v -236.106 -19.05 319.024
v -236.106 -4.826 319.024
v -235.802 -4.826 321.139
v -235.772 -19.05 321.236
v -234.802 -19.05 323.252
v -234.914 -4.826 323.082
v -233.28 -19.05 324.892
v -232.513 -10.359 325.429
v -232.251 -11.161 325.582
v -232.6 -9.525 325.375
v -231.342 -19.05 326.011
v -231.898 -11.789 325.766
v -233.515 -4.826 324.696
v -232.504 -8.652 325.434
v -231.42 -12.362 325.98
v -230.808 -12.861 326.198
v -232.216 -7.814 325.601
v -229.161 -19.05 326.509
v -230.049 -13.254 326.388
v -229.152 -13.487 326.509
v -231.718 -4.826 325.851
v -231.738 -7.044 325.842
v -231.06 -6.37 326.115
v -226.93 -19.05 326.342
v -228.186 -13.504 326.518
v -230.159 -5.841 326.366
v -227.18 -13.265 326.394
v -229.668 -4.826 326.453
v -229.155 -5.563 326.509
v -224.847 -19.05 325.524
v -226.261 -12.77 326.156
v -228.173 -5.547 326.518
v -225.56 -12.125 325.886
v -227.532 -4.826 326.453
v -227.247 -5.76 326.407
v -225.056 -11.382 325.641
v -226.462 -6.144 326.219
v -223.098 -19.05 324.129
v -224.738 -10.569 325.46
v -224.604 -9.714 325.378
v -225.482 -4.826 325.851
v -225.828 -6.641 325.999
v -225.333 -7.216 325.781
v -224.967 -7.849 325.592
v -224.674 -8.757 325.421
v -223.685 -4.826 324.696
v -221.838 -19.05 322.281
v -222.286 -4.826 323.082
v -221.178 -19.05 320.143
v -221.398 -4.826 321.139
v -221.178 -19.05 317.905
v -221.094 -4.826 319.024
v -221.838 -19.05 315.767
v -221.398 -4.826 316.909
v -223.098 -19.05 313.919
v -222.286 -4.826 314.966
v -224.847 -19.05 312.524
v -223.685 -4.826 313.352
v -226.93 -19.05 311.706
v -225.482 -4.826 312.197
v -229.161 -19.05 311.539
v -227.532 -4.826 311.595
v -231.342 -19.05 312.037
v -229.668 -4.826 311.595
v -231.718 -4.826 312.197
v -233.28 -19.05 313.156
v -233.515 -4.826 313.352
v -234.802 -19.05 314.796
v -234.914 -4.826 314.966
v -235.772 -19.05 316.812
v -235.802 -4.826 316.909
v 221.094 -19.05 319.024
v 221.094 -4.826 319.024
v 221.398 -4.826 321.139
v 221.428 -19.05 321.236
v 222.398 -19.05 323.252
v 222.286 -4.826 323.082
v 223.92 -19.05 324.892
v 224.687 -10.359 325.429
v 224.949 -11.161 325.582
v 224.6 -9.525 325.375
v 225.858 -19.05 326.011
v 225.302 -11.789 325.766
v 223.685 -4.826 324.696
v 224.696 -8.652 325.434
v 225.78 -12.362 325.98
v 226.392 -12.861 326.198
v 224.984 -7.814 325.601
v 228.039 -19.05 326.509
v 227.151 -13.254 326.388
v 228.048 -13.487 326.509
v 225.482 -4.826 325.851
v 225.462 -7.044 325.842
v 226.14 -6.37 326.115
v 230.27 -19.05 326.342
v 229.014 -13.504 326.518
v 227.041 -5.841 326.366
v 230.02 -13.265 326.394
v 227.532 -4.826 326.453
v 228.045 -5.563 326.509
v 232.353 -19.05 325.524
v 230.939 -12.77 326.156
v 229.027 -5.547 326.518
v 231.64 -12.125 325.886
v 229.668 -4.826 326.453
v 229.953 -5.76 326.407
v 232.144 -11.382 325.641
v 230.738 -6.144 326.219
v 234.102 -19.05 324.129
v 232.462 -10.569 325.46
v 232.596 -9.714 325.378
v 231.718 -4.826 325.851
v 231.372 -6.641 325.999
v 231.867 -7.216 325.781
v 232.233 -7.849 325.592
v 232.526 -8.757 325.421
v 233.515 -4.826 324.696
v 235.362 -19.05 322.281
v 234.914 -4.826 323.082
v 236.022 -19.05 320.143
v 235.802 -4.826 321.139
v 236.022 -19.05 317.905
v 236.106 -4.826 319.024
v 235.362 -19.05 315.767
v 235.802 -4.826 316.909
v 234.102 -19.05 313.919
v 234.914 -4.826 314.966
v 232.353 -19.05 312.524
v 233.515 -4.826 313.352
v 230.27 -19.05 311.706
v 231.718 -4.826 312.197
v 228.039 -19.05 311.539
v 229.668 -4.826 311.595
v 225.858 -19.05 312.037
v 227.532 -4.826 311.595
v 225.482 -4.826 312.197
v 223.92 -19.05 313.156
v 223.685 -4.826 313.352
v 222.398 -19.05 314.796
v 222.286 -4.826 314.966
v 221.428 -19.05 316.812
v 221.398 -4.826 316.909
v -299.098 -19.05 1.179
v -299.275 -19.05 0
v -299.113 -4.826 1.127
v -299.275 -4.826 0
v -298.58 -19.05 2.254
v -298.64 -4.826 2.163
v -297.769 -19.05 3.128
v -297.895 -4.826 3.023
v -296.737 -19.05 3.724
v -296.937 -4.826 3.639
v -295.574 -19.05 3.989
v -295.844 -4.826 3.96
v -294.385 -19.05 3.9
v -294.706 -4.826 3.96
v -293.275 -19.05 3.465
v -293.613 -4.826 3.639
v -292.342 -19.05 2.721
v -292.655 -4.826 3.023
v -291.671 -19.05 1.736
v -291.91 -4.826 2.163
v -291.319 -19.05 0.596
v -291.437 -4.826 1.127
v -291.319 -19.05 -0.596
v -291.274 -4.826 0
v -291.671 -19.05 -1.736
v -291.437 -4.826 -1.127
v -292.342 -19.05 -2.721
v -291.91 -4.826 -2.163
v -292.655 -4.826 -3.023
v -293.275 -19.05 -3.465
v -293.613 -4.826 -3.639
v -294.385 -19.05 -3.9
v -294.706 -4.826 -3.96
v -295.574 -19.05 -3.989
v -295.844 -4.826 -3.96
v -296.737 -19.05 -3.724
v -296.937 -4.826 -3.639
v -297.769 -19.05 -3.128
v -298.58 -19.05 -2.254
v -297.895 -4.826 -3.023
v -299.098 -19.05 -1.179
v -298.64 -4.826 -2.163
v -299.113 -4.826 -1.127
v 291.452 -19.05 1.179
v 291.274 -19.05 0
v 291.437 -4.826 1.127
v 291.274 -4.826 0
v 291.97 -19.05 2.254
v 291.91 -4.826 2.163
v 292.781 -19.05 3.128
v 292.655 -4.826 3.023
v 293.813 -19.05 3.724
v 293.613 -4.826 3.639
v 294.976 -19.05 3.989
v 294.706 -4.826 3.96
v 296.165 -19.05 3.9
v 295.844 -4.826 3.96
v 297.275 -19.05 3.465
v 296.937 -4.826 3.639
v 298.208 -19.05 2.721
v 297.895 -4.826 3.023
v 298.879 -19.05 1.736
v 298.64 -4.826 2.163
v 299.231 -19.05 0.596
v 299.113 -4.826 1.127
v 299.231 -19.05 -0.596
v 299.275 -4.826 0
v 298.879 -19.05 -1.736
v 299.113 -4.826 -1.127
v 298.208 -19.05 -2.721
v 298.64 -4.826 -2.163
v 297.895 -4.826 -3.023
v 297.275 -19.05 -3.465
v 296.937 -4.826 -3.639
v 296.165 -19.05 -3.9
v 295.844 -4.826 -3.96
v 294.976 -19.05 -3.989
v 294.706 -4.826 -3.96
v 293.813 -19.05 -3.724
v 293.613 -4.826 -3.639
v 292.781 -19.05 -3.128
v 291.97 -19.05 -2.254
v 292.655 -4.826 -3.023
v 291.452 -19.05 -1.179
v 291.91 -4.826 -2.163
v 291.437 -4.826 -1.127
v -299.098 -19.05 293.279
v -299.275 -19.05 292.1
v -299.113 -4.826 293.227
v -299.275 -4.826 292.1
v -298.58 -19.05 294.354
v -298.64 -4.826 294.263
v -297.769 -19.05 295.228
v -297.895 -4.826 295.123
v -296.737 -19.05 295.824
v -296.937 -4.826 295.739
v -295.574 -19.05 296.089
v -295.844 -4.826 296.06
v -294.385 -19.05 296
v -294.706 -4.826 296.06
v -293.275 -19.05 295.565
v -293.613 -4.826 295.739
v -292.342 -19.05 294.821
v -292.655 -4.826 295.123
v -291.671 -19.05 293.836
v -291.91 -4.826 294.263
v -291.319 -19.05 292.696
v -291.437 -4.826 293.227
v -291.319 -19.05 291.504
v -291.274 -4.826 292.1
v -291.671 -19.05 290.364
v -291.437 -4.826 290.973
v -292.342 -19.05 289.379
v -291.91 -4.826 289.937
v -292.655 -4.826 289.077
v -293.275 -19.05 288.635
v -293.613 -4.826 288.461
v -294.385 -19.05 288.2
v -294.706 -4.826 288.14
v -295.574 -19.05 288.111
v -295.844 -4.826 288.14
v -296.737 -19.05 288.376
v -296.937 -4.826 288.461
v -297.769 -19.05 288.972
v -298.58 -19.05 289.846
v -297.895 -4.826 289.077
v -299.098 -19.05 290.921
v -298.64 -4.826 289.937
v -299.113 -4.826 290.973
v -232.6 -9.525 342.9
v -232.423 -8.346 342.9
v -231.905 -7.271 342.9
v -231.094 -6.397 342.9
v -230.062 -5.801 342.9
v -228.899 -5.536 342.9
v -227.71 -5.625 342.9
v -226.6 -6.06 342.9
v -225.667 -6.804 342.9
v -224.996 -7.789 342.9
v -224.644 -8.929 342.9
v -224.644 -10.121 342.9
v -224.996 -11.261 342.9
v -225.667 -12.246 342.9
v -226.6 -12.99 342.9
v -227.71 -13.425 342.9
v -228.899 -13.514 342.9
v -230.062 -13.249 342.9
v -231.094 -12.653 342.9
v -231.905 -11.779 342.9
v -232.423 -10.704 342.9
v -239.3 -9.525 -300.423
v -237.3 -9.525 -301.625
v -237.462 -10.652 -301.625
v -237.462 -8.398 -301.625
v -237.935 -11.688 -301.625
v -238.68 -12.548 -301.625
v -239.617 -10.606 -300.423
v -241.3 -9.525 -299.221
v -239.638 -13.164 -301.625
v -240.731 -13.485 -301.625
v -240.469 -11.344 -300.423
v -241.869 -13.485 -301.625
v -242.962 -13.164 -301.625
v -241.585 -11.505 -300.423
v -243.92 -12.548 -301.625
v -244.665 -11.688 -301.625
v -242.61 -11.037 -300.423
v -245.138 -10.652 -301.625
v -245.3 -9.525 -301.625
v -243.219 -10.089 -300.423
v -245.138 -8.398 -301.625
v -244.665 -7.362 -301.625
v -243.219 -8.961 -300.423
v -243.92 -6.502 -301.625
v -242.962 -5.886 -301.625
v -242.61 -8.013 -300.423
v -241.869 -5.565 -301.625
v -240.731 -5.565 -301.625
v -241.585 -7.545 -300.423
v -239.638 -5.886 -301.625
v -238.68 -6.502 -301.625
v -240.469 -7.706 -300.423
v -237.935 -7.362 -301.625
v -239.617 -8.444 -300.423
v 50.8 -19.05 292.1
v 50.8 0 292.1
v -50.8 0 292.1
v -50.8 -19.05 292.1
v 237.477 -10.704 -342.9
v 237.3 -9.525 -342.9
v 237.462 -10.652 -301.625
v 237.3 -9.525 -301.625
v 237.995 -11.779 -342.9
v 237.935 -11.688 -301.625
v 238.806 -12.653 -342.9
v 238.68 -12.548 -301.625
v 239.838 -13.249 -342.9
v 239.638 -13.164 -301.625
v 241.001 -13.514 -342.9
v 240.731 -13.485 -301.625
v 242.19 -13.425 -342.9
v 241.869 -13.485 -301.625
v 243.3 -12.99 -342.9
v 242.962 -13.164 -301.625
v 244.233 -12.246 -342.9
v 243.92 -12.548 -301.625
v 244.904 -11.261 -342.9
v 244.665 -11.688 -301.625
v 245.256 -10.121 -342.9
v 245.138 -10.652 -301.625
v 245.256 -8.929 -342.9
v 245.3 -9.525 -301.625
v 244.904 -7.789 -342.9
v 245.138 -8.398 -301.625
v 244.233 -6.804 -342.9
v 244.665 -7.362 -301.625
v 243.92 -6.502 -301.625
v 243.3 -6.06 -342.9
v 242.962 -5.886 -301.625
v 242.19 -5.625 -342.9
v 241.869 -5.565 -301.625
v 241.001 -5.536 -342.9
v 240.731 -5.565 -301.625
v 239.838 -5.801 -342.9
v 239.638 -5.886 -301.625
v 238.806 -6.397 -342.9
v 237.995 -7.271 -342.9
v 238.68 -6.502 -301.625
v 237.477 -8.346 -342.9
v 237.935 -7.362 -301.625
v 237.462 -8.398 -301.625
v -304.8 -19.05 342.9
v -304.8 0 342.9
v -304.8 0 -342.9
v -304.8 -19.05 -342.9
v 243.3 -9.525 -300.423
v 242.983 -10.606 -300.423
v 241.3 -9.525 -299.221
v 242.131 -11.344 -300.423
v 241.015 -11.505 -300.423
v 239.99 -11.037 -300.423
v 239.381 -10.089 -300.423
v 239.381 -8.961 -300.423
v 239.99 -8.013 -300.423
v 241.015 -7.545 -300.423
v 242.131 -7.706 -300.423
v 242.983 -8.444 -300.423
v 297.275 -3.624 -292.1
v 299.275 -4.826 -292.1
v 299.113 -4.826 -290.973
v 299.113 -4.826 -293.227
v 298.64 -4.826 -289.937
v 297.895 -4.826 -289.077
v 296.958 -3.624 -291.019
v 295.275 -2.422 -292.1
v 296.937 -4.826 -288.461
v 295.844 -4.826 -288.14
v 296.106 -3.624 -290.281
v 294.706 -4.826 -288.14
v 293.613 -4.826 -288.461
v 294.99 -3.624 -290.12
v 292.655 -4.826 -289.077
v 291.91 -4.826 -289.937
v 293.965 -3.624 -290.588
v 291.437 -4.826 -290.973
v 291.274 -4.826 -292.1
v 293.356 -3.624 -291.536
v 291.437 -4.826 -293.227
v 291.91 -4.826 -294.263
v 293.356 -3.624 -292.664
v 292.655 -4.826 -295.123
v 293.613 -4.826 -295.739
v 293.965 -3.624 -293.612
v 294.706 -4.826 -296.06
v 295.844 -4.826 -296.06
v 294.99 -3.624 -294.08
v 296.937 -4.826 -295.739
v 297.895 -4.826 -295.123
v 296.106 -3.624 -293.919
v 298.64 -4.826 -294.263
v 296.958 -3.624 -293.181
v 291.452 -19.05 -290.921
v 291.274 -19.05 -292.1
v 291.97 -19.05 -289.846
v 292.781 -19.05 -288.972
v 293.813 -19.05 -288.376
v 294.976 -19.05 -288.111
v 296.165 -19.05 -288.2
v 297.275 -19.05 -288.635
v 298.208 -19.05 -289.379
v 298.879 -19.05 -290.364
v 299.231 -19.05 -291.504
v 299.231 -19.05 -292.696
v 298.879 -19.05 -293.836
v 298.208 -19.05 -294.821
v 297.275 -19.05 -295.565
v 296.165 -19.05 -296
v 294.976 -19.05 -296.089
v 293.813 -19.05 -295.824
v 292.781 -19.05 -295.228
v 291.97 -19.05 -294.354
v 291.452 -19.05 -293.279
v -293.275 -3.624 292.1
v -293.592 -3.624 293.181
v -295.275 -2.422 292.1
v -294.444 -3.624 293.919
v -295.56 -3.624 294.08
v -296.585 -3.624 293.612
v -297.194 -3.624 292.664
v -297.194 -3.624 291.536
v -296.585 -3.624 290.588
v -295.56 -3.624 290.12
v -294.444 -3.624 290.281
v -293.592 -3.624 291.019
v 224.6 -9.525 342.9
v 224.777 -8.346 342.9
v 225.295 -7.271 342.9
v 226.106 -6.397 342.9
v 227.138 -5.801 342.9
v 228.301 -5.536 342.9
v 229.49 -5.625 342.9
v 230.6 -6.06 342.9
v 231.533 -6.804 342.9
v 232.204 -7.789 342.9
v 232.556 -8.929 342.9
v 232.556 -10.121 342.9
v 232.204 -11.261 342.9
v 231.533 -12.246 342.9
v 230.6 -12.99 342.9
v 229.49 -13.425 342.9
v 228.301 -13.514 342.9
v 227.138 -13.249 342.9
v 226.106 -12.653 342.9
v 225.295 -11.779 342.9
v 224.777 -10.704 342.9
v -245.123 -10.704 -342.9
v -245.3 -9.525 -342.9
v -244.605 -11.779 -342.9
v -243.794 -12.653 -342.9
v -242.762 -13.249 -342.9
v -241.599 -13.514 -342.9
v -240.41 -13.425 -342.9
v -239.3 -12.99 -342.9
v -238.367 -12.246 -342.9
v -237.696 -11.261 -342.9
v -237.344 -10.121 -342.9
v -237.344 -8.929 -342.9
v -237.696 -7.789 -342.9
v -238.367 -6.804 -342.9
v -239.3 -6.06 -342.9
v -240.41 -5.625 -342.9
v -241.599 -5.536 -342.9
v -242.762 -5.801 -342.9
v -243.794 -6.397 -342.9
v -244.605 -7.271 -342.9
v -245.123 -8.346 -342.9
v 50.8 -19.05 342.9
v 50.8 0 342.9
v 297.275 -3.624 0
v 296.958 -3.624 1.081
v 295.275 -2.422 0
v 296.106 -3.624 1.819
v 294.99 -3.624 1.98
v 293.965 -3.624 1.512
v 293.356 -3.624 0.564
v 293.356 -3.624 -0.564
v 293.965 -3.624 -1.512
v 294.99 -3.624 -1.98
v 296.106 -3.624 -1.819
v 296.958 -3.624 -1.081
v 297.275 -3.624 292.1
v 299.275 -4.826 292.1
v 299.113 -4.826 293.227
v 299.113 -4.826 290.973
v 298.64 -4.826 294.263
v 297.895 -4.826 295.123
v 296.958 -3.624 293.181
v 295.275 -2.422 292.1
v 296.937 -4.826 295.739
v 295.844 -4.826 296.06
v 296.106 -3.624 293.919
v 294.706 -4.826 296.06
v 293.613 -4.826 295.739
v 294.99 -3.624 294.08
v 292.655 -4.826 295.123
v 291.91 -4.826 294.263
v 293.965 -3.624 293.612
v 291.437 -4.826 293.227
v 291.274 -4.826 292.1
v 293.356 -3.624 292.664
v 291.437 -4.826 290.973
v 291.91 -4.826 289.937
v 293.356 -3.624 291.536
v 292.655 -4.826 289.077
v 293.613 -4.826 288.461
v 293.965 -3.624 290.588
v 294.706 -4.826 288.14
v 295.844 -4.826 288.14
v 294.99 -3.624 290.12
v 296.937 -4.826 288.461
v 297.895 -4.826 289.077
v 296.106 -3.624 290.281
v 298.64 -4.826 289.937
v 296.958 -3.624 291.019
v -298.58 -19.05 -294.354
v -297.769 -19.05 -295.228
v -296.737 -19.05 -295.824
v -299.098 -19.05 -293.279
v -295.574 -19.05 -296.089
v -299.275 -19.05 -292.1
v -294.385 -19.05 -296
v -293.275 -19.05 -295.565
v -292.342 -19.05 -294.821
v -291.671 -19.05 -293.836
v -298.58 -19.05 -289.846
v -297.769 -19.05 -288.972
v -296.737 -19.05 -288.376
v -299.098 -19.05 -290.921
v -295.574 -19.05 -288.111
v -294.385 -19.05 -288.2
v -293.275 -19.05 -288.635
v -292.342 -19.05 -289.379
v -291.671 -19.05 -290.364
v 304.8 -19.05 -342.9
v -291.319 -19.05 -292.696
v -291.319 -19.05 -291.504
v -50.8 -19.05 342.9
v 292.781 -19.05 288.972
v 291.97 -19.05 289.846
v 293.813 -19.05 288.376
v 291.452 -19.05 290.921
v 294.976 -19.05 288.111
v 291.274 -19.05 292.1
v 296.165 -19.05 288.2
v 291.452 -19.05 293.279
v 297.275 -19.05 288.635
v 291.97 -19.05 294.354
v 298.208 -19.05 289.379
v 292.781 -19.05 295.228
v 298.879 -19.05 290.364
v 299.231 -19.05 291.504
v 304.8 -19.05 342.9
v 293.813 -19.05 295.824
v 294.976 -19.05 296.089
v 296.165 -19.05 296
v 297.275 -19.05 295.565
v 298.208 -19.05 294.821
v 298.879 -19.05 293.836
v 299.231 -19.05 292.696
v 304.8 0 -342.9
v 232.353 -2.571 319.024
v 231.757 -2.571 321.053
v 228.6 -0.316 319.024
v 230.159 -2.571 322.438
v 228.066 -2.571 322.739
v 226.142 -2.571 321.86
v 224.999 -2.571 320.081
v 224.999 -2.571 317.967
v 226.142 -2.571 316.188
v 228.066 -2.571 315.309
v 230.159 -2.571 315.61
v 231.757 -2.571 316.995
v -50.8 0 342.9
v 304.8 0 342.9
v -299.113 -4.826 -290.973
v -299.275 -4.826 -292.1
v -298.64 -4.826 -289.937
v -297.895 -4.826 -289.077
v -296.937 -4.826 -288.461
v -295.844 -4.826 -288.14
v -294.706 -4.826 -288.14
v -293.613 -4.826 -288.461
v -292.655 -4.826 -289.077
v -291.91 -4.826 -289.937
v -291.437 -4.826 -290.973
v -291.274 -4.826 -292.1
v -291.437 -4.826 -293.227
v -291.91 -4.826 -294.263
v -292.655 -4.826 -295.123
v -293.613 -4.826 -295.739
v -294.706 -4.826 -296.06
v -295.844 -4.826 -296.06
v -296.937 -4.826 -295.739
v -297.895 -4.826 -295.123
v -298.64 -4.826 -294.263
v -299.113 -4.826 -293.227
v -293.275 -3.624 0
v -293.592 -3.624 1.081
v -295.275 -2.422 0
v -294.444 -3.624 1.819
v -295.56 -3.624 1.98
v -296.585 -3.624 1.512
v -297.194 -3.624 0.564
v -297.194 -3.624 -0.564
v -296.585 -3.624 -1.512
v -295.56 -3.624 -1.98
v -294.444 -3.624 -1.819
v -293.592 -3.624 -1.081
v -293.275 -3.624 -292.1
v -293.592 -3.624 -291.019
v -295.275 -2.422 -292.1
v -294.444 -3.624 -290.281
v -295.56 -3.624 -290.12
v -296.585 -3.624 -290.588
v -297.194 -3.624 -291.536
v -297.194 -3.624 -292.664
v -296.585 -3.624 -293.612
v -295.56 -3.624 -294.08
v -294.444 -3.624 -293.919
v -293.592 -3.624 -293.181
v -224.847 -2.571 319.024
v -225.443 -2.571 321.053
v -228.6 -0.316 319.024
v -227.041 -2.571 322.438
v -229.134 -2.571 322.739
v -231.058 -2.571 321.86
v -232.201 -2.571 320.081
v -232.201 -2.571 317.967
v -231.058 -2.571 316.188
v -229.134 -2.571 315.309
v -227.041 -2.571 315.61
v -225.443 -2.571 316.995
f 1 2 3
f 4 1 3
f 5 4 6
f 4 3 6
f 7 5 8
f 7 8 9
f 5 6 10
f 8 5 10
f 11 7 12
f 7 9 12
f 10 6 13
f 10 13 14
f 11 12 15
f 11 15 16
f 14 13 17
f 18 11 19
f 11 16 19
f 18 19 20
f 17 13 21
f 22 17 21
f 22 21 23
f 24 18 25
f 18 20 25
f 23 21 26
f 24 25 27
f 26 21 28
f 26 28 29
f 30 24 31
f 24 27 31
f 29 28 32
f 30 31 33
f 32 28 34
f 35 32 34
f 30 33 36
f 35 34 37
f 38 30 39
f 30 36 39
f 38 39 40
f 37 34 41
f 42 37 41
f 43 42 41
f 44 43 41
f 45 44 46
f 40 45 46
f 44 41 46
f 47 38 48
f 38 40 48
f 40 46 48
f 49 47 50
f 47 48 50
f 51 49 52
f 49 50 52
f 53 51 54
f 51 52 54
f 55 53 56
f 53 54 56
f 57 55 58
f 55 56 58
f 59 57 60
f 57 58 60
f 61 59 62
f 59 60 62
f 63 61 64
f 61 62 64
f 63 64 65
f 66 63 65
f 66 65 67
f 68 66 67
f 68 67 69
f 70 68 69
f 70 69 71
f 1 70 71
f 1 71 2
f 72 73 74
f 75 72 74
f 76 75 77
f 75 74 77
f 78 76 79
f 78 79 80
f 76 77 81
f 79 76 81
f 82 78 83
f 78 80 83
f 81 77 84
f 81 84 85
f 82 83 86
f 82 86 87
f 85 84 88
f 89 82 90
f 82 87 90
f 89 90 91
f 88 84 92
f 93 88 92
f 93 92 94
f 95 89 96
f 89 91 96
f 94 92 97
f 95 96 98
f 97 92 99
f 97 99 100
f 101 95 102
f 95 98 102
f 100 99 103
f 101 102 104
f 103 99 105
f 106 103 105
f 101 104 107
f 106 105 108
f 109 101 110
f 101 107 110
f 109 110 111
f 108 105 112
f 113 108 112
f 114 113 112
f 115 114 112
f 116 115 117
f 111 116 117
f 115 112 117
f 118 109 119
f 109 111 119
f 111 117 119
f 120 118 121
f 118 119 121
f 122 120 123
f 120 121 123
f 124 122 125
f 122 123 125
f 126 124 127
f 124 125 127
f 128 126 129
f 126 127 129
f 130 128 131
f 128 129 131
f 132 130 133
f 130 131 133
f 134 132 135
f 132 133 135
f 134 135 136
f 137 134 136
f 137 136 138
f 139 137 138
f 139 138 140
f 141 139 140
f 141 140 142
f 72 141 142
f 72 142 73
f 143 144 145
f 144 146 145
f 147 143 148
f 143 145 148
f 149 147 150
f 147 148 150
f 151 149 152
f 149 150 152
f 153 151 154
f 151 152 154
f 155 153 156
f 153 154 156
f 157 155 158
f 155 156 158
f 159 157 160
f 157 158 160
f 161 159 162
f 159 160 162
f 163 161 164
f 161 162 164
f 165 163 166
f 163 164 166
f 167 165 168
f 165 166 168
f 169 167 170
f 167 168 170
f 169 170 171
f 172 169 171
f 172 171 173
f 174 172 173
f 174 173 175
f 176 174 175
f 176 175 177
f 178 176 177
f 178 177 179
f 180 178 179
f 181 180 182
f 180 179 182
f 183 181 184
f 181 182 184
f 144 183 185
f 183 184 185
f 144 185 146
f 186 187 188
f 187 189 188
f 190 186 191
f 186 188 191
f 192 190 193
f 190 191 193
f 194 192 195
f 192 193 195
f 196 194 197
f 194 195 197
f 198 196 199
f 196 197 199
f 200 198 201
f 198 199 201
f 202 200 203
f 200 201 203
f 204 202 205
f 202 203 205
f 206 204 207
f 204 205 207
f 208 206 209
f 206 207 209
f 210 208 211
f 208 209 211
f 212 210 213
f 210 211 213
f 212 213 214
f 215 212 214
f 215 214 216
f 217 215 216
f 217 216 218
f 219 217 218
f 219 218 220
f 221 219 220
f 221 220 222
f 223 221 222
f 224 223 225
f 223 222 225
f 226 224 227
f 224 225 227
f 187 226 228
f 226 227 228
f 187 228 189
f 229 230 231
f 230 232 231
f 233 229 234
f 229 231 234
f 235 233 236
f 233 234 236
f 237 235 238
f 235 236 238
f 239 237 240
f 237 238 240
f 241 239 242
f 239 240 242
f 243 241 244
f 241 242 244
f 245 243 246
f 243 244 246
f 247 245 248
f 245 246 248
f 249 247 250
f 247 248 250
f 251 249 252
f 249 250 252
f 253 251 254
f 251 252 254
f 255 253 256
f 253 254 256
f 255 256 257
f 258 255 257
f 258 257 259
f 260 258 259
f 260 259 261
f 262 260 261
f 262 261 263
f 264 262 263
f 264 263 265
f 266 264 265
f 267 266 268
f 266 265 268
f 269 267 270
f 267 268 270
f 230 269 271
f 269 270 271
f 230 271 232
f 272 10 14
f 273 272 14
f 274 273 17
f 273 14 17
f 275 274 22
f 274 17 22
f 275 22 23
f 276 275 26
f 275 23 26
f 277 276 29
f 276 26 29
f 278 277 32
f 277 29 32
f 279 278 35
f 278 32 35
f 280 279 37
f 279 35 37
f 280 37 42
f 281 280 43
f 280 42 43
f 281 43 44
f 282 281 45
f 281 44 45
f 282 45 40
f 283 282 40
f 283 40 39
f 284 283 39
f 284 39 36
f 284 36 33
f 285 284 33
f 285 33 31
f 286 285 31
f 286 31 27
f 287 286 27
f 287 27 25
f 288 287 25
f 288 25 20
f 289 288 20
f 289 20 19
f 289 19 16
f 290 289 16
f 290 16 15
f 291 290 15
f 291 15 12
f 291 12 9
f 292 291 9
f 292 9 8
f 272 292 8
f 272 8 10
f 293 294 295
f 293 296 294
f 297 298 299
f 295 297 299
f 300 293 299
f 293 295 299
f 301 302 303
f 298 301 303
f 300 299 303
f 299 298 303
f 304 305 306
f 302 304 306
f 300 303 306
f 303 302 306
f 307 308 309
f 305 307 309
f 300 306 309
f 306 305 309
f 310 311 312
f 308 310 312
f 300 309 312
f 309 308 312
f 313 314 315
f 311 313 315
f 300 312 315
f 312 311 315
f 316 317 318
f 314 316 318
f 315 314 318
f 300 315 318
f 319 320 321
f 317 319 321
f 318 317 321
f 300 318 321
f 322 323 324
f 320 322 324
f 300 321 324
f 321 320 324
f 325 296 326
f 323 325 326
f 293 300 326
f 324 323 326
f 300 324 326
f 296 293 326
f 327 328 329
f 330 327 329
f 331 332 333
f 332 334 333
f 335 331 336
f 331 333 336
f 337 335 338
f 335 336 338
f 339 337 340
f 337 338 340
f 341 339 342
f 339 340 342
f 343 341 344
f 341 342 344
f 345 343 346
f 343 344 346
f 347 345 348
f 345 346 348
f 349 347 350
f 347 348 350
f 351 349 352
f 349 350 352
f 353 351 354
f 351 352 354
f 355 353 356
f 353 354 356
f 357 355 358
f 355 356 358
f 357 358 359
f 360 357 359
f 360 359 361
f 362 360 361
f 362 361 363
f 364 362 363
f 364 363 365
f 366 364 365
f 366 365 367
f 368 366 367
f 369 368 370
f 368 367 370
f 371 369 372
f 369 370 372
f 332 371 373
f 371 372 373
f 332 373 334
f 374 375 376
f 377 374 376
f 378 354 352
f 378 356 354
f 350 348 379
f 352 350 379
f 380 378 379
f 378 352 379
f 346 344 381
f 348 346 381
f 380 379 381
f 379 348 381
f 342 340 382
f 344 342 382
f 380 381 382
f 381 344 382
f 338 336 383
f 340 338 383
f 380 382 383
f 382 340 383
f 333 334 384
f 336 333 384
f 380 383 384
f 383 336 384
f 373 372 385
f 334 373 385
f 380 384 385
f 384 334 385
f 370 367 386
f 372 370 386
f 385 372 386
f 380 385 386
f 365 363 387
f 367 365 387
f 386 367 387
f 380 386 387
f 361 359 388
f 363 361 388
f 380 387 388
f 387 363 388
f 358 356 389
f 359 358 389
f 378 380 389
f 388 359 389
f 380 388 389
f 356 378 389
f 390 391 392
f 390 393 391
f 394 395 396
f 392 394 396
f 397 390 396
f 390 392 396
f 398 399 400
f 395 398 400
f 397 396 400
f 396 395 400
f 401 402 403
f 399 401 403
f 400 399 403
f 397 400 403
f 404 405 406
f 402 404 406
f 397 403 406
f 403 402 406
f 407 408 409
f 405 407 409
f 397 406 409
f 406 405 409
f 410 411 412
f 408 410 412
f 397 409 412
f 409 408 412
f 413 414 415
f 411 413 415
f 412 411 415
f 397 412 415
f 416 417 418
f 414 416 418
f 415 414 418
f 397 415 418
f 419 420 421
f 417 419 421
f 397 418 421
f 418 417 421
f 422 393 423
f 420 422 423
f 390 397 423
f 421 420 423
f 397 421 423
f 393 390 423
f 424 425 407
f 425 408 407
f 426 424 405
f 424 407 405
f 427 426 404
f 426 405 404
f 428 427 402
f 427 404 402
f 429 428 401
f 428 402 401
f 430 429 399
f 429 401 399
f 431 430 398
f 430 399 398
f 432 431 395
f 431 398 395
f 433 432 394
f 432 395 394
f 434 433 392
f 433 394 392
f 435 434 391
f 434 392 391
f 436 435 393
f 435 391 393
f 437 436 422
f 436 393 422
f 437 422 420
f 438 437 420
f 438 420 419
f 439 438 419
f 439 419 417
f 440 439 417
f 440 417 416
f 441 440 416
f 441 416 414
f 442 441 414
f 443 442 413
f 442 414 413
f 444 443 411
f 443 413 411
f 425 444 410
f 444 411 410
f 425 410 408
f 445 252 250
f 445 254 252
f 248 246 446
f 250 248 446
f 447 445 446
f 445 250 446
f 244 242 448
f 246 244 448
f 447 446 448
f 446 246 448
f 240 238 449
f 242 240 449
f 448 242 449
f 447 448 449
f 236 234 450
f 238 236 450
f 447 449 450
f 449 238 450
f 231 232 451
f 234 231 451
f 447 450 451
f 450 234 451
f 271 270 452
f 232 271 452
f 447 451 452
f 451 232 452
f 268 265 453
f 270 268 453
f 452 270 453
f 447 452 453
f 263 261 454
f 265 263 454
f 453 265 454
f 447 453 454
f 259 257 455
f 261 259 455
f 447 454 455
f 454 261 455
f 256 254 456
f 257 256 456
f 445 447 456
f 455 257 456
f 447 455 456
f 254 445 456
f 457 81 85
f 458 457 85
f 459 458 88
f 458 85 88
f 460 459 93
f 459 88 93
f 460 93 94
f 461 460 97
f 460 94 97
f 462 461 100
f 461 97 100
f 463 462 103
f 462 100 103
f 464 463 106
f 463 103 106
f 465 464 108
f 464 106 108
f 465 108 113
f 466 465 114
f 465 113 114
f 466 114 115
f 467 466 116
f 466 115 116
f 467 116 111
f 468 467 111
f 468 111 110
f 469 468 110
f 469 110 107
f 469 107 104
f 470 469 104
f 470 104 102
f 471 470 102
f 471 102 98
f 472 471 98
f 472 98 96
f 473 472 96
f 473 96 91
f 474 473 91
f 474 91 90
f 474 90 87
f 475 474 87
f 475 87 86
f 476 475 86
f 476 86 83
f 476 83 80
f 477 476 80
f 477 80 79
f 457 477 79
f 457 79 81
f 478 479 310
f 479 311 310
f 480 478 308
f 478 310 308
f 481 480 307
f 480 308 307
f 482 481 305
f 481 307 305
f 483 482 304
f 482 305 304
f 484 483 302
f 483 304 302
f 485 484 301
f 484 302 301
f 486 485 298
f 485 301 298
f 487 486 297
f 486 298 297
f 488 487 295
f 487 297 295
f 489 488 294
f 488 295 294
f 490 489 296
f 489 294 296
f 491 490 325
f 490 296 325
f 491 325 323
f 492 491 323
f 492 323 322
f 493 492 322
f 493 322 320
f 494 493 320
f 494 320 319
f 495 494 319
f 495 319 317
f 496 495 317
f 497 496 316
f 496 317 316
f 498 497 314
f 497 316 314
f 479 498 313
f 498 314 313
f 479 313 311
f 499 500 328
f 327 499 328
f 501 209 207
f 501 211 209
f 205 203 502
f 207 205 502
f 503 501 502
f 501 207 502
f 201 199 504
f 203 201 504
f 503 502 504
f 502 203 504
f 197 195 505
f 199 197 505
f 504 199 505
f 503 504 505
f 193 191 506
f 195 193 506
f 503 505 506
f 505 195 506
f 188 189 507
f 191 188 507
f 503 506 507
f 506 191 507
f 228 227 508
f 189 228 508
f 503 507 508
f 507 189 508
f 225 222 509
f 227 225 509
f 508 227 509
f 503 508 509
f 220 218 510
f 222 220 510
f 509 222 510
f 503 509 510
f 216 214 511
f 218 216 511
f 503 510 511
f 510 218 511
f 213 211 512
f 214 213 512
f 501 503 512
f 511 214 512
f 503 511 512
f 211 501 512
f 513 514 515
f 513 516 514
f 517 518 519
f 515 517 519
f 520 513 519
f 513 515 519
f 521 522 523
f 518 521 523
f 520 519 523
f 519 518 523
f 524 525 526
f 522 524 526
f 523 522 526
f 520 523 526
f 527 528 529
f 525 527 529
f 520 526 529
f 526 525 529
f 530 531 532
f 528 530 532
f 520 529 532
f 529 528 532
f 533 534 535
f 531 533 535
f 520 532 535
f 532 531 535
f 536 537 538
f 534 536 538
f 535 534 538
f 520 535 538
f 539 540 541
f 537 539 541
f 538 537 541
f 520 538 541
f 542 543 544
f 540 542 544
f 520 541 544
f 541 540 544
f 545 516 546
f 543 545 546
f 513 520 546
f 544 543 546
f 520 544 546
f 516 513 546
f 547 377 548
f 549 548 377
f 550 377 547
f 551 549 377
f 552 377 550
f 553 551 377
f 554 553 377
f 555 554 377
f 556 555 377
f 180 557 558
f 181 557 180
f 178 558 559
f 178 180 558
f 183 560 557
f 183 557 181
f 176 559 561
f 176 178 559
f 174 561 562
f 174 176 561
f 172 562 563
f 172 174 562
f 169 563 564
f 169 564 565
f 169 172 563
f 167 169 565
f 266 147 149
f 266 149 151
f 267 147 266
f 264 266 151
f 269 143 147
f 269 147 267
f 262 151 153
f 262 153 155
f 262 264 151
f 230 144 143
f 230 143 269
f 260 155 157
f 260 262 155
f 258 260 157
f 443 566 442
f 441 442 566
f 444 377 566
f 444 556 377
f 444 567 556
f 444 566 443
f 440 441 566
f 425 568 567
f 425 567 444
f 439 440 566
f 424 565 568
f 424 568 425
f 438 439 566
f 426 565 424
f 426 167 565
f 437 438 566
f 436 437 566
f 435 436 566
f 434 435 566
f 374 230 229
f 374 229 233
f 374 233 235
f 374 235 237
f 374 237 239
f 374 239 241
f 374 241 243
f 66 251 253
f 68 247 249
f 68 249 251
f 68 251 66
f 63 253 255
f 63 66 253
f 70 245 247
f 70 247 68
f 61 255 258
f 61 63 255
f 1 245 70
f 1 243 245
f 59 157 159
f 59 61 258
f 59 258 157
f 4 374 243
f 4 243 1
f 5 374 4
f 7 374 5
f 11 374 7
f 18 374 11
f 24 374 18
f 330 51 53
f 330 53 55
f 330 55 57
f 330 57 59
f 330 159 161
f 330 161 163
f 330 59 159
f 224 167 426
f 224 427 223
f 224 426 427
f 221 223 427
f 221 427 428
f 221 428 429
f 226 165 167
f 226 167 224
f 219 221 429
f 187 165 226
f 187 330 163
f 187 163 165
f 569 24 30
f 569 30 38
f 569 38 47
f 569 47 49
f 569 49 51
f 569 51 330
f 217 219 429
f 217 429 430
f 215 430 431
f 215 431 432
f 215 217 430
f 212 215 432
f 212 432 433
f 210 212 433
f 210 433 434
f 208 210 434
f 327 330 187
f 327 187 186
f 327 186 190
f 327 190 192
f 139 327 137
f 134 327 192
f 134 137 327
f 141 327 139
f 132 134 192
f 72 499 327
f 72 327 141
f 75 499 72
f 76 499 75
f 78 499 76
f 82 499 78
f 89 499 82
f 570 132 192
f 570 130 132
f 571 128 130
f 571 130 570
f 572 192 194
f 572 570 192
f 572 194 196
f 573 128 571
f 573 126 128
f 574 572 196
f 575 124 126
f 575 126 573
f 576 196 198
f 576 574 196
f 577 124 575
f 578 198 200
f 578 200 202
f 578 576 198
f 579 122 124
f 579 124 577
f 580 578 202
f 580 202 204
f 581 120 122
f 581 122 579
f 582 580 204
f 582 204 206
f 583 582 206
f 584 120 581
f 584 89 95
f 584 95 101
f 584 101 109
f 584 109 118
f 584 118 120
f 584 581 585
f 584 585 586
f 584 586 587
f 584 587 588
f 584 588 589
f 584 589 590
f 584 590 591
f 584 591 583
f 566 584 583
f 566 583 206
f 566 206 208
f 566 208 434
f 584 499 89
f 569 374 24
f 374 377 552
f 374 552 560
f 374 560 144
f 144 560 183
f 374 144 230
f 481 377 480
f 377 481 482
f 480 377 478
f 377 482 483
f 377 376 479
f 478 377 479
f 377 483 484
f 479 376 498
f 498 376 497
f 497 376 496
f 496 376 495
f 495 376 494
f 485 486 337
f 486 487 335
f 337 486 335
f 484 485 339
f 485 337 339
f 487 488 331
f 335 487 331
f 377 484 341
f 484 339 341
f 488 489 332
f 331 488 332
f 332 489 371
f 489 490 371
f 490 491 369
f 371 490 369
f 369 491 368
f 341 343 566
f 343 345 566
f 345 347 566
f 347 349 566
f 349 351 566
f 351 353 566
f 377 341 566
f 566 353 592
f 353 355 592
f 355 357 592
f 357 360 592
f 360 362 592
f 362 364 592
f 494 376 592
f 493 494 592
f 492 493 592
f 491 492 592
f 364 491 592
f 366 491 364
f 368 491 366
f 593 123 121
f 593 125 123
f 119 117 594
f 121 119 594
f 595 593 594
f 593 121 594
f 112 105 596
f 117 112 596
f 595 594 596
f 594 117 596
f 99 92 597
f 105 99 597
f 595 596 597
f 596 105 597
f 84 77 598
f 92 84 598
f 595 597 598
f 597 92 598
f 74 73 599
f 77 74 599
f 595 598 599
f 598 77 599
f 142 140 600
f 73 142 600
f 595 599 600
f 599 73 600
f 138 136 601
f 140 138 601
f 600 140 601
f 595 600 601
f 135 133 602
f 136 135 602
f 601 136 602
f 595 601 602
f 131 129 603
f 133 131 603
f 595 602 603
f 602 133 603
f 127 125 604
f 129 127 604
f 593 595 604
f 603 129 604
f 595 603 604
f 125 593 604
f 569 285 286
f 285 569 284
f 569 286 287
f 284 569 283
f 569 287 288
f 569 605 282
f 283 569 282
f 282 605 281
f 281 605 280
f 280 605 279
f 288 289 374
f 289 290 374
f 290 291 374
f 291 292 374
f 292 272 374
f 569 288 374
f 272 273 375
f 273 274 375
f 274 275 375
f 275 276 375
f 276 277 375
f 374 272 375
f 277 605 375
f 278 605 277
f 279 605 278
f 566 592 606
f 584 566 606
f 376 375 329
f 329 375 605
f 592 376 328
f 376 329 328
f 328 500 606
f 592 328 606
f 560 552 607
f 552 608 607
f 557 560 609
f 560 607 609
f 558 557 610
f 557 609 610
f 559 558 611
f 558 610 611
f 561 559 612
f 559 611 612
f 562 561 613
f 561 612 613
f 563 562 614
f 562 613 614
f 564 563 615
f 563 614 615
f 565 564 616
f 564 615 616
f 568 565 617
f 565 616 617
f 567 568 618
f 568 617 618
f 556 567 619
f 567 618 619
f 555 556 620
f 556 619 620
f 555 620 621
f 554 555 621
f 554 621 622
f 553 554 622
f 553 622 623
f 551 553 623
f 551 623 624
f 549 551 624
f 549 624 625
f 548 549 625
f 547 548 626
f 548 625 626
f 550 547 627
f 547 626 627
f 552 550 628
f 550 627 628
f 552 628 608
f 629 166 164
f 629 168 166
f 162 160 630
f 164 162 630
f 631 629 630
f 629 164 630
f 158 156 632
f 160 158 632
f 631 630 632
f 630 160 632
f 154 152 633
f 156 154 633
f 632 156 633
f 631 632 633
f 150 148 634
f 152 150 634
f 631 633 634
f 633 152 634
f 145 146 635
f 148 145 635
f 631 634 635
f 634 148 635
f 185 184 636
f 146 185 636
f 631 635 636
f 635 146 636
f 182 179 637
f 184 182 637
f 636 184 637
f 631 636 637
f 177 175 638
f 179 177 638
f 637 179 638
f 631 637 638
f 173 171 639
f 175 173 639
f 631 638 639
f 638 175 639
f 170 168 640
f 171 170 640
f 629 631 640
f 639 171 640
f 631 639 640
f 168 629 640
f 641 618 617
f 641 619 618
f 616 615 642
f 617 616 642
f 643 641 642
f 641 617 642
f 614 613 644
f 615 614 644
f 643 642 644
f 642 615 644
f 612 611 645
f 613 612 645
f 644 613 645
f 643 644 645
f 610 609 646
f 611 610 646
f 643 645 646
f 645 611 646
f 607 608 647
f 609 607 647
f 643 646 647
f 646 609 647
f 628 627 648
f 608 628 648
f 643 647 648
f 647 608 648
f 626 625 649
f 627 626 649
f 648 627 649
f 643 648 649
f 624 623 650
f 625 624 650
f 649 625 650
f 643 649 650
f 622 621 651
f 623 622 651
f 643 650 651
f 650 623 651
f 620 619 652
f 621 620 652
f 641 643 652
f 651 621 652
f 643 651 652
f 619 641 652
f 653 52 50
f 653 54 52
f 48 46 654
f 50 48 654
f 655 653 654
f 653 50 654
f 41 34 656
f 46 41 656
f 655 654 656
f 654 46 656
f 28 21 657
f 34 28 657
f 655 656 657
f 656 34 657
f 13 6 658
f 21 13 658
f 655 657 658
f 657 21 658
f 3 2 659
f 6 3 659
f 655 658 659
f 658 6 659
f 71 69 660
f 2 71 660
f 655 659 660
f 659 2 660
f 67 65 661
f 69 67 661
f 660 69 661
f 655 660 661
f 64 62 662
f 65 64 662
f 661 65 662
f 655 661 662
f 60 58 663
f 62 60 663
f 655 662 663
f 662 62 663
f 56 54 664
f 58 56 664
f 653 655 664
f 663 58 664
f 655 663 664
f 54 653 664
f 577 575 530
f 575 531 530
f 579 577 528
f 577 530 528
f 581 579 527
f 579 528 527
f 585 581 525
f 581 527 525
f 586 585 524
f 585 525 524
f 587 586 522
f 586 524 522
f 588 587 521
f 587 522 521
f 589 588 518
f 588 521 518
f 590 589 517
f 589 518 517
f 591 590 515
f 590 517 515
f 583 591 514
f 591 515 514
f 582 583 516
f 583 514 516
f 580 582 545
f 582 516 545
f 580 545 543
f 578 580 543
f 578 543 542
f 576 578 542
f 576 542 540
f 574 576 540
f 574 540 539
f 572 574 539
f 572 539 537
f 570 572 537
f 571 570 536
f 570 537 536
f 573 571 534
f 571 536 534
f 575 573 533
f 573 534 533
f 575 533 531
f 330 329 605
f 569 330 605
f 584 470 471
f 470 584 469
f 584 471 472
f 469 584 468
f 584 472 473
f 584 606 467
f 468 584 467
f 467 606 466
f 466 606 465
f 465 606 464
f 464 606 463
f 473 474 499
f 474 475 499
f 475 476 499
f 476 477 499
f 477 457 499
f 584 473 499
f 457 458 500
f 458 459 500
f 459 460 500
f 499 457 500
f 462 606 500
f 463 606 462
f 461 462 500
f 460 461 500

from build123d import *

# Parameters (mm, degrees)
F1_DEPTH       = 19.05
F3_D           = 15.0114
F3_DEPTH       = 14.224
F3_TIP         = 4.5098795482
F6_D           = 8.001
F6_DEPTH       = 25.4
F6_TIP         = 2.4037429064
F6_ON_F5_D     = 8.001
F6_ON_F5_DEPTH = 25.4
F6_ON_F5_TIP   = 2.4037429064
F8_D           = 8.001
F8_DEPTH       = 14.224
F8_TIP         = 2.4037429064
F10_D          = 8.001
F10_DEPTH      = 41.275
F10_TIP        = 2.4037429064


with BuildPart() as f1:
    # F0 (on Front) → F1 (new body)
    with BuildSketch(Plane.XZ):
        Polygon((-304.8, -342.9), (304.8, -342.9), (304.8, 342.9), (50.8, 342.9), (50.8, 292.1), (-50.8, 292.1), (-50.8, 342.9), (-304.8, 342.9), align=None)
    extrude(amount=F1_DEPTH)

    # F3
    with Locations(Plane.XZ.offset(19.05)):
        with Locations((-228.6, 319.024), (228.6, 319.024)):
            Hole(F3_D / 2, depth=F3_DEPTH)
            with Locations((0, 0, -(F3_DEPTH + F3_TIP / 2))):  # 118° drill point
                Cone(0, F3_D / 2, F3_TIP, mode=Mode.SUBTRACT)

    # F6
    with Locations(Plane.XY.offset(342.9)):
        with Locations((-228.6, -9.525)):
            Hole(F6_D / 2, depth=F6_DEPTH)
            with Locations((0, 0, -(F6_DEPTH + F6_TIP / 2))):  # 118° drill point
                Cone(0, F6_D / 2, F6_TIP, mode=Mode.SUBTRACT)

    # F6 on F5
    with Locations(Plane.XY.offset(342.9)):
        with Locations((228.6, -9.525)):
            Hole(F6_ON_F5_D / 2, depth=F6_ON_F5_DEPTH)
            with Locations((0, 0, -(F6_ON_F5_DEPTH + F6_ON_F5_TIP / 2))):  # 118° drill point
                Cone(0, F6_ON_F5_D / 2, F6_ON_F5_TIP, mode=Mode.SUBTRACT)

    # F8
    with Locations(Plane.XZ.offset(19.05)):
        with Locations((-295.275, 292.1), (-295.275, 0), (-295.275, -292.1), (295.275, -292.1), (295.275, 0), (295.275, 292.1)):
            Hole(F8_D / 2, depth=F8_DEPTH)
            with Locations((0, 0, -(F8_DEPTH + F8_TIP / 2))):  # 118° drill point
                Cone(0, F8_D / 2, F8_TIP, mode=Mode.SUBTRACT)

    # F10
    with Locations(Plane(origin=(0, 0, -342.9), x_dir=(1, 0, 0), z_dir=(0, 0, -1))):
        with Locations((-241.3, 9.525), (241.3, 9.525)):
            Hole(F10_D / 2, depth=F10_DEPTH)
            with Locations((0, 0, -(F10_DEPTH + F10_TIP / 2))):  # 118° drill point
                Cone(0, F10_D / 2, F10_TIP, mode=Mode.SUBTRACT)


solid = f1.part
